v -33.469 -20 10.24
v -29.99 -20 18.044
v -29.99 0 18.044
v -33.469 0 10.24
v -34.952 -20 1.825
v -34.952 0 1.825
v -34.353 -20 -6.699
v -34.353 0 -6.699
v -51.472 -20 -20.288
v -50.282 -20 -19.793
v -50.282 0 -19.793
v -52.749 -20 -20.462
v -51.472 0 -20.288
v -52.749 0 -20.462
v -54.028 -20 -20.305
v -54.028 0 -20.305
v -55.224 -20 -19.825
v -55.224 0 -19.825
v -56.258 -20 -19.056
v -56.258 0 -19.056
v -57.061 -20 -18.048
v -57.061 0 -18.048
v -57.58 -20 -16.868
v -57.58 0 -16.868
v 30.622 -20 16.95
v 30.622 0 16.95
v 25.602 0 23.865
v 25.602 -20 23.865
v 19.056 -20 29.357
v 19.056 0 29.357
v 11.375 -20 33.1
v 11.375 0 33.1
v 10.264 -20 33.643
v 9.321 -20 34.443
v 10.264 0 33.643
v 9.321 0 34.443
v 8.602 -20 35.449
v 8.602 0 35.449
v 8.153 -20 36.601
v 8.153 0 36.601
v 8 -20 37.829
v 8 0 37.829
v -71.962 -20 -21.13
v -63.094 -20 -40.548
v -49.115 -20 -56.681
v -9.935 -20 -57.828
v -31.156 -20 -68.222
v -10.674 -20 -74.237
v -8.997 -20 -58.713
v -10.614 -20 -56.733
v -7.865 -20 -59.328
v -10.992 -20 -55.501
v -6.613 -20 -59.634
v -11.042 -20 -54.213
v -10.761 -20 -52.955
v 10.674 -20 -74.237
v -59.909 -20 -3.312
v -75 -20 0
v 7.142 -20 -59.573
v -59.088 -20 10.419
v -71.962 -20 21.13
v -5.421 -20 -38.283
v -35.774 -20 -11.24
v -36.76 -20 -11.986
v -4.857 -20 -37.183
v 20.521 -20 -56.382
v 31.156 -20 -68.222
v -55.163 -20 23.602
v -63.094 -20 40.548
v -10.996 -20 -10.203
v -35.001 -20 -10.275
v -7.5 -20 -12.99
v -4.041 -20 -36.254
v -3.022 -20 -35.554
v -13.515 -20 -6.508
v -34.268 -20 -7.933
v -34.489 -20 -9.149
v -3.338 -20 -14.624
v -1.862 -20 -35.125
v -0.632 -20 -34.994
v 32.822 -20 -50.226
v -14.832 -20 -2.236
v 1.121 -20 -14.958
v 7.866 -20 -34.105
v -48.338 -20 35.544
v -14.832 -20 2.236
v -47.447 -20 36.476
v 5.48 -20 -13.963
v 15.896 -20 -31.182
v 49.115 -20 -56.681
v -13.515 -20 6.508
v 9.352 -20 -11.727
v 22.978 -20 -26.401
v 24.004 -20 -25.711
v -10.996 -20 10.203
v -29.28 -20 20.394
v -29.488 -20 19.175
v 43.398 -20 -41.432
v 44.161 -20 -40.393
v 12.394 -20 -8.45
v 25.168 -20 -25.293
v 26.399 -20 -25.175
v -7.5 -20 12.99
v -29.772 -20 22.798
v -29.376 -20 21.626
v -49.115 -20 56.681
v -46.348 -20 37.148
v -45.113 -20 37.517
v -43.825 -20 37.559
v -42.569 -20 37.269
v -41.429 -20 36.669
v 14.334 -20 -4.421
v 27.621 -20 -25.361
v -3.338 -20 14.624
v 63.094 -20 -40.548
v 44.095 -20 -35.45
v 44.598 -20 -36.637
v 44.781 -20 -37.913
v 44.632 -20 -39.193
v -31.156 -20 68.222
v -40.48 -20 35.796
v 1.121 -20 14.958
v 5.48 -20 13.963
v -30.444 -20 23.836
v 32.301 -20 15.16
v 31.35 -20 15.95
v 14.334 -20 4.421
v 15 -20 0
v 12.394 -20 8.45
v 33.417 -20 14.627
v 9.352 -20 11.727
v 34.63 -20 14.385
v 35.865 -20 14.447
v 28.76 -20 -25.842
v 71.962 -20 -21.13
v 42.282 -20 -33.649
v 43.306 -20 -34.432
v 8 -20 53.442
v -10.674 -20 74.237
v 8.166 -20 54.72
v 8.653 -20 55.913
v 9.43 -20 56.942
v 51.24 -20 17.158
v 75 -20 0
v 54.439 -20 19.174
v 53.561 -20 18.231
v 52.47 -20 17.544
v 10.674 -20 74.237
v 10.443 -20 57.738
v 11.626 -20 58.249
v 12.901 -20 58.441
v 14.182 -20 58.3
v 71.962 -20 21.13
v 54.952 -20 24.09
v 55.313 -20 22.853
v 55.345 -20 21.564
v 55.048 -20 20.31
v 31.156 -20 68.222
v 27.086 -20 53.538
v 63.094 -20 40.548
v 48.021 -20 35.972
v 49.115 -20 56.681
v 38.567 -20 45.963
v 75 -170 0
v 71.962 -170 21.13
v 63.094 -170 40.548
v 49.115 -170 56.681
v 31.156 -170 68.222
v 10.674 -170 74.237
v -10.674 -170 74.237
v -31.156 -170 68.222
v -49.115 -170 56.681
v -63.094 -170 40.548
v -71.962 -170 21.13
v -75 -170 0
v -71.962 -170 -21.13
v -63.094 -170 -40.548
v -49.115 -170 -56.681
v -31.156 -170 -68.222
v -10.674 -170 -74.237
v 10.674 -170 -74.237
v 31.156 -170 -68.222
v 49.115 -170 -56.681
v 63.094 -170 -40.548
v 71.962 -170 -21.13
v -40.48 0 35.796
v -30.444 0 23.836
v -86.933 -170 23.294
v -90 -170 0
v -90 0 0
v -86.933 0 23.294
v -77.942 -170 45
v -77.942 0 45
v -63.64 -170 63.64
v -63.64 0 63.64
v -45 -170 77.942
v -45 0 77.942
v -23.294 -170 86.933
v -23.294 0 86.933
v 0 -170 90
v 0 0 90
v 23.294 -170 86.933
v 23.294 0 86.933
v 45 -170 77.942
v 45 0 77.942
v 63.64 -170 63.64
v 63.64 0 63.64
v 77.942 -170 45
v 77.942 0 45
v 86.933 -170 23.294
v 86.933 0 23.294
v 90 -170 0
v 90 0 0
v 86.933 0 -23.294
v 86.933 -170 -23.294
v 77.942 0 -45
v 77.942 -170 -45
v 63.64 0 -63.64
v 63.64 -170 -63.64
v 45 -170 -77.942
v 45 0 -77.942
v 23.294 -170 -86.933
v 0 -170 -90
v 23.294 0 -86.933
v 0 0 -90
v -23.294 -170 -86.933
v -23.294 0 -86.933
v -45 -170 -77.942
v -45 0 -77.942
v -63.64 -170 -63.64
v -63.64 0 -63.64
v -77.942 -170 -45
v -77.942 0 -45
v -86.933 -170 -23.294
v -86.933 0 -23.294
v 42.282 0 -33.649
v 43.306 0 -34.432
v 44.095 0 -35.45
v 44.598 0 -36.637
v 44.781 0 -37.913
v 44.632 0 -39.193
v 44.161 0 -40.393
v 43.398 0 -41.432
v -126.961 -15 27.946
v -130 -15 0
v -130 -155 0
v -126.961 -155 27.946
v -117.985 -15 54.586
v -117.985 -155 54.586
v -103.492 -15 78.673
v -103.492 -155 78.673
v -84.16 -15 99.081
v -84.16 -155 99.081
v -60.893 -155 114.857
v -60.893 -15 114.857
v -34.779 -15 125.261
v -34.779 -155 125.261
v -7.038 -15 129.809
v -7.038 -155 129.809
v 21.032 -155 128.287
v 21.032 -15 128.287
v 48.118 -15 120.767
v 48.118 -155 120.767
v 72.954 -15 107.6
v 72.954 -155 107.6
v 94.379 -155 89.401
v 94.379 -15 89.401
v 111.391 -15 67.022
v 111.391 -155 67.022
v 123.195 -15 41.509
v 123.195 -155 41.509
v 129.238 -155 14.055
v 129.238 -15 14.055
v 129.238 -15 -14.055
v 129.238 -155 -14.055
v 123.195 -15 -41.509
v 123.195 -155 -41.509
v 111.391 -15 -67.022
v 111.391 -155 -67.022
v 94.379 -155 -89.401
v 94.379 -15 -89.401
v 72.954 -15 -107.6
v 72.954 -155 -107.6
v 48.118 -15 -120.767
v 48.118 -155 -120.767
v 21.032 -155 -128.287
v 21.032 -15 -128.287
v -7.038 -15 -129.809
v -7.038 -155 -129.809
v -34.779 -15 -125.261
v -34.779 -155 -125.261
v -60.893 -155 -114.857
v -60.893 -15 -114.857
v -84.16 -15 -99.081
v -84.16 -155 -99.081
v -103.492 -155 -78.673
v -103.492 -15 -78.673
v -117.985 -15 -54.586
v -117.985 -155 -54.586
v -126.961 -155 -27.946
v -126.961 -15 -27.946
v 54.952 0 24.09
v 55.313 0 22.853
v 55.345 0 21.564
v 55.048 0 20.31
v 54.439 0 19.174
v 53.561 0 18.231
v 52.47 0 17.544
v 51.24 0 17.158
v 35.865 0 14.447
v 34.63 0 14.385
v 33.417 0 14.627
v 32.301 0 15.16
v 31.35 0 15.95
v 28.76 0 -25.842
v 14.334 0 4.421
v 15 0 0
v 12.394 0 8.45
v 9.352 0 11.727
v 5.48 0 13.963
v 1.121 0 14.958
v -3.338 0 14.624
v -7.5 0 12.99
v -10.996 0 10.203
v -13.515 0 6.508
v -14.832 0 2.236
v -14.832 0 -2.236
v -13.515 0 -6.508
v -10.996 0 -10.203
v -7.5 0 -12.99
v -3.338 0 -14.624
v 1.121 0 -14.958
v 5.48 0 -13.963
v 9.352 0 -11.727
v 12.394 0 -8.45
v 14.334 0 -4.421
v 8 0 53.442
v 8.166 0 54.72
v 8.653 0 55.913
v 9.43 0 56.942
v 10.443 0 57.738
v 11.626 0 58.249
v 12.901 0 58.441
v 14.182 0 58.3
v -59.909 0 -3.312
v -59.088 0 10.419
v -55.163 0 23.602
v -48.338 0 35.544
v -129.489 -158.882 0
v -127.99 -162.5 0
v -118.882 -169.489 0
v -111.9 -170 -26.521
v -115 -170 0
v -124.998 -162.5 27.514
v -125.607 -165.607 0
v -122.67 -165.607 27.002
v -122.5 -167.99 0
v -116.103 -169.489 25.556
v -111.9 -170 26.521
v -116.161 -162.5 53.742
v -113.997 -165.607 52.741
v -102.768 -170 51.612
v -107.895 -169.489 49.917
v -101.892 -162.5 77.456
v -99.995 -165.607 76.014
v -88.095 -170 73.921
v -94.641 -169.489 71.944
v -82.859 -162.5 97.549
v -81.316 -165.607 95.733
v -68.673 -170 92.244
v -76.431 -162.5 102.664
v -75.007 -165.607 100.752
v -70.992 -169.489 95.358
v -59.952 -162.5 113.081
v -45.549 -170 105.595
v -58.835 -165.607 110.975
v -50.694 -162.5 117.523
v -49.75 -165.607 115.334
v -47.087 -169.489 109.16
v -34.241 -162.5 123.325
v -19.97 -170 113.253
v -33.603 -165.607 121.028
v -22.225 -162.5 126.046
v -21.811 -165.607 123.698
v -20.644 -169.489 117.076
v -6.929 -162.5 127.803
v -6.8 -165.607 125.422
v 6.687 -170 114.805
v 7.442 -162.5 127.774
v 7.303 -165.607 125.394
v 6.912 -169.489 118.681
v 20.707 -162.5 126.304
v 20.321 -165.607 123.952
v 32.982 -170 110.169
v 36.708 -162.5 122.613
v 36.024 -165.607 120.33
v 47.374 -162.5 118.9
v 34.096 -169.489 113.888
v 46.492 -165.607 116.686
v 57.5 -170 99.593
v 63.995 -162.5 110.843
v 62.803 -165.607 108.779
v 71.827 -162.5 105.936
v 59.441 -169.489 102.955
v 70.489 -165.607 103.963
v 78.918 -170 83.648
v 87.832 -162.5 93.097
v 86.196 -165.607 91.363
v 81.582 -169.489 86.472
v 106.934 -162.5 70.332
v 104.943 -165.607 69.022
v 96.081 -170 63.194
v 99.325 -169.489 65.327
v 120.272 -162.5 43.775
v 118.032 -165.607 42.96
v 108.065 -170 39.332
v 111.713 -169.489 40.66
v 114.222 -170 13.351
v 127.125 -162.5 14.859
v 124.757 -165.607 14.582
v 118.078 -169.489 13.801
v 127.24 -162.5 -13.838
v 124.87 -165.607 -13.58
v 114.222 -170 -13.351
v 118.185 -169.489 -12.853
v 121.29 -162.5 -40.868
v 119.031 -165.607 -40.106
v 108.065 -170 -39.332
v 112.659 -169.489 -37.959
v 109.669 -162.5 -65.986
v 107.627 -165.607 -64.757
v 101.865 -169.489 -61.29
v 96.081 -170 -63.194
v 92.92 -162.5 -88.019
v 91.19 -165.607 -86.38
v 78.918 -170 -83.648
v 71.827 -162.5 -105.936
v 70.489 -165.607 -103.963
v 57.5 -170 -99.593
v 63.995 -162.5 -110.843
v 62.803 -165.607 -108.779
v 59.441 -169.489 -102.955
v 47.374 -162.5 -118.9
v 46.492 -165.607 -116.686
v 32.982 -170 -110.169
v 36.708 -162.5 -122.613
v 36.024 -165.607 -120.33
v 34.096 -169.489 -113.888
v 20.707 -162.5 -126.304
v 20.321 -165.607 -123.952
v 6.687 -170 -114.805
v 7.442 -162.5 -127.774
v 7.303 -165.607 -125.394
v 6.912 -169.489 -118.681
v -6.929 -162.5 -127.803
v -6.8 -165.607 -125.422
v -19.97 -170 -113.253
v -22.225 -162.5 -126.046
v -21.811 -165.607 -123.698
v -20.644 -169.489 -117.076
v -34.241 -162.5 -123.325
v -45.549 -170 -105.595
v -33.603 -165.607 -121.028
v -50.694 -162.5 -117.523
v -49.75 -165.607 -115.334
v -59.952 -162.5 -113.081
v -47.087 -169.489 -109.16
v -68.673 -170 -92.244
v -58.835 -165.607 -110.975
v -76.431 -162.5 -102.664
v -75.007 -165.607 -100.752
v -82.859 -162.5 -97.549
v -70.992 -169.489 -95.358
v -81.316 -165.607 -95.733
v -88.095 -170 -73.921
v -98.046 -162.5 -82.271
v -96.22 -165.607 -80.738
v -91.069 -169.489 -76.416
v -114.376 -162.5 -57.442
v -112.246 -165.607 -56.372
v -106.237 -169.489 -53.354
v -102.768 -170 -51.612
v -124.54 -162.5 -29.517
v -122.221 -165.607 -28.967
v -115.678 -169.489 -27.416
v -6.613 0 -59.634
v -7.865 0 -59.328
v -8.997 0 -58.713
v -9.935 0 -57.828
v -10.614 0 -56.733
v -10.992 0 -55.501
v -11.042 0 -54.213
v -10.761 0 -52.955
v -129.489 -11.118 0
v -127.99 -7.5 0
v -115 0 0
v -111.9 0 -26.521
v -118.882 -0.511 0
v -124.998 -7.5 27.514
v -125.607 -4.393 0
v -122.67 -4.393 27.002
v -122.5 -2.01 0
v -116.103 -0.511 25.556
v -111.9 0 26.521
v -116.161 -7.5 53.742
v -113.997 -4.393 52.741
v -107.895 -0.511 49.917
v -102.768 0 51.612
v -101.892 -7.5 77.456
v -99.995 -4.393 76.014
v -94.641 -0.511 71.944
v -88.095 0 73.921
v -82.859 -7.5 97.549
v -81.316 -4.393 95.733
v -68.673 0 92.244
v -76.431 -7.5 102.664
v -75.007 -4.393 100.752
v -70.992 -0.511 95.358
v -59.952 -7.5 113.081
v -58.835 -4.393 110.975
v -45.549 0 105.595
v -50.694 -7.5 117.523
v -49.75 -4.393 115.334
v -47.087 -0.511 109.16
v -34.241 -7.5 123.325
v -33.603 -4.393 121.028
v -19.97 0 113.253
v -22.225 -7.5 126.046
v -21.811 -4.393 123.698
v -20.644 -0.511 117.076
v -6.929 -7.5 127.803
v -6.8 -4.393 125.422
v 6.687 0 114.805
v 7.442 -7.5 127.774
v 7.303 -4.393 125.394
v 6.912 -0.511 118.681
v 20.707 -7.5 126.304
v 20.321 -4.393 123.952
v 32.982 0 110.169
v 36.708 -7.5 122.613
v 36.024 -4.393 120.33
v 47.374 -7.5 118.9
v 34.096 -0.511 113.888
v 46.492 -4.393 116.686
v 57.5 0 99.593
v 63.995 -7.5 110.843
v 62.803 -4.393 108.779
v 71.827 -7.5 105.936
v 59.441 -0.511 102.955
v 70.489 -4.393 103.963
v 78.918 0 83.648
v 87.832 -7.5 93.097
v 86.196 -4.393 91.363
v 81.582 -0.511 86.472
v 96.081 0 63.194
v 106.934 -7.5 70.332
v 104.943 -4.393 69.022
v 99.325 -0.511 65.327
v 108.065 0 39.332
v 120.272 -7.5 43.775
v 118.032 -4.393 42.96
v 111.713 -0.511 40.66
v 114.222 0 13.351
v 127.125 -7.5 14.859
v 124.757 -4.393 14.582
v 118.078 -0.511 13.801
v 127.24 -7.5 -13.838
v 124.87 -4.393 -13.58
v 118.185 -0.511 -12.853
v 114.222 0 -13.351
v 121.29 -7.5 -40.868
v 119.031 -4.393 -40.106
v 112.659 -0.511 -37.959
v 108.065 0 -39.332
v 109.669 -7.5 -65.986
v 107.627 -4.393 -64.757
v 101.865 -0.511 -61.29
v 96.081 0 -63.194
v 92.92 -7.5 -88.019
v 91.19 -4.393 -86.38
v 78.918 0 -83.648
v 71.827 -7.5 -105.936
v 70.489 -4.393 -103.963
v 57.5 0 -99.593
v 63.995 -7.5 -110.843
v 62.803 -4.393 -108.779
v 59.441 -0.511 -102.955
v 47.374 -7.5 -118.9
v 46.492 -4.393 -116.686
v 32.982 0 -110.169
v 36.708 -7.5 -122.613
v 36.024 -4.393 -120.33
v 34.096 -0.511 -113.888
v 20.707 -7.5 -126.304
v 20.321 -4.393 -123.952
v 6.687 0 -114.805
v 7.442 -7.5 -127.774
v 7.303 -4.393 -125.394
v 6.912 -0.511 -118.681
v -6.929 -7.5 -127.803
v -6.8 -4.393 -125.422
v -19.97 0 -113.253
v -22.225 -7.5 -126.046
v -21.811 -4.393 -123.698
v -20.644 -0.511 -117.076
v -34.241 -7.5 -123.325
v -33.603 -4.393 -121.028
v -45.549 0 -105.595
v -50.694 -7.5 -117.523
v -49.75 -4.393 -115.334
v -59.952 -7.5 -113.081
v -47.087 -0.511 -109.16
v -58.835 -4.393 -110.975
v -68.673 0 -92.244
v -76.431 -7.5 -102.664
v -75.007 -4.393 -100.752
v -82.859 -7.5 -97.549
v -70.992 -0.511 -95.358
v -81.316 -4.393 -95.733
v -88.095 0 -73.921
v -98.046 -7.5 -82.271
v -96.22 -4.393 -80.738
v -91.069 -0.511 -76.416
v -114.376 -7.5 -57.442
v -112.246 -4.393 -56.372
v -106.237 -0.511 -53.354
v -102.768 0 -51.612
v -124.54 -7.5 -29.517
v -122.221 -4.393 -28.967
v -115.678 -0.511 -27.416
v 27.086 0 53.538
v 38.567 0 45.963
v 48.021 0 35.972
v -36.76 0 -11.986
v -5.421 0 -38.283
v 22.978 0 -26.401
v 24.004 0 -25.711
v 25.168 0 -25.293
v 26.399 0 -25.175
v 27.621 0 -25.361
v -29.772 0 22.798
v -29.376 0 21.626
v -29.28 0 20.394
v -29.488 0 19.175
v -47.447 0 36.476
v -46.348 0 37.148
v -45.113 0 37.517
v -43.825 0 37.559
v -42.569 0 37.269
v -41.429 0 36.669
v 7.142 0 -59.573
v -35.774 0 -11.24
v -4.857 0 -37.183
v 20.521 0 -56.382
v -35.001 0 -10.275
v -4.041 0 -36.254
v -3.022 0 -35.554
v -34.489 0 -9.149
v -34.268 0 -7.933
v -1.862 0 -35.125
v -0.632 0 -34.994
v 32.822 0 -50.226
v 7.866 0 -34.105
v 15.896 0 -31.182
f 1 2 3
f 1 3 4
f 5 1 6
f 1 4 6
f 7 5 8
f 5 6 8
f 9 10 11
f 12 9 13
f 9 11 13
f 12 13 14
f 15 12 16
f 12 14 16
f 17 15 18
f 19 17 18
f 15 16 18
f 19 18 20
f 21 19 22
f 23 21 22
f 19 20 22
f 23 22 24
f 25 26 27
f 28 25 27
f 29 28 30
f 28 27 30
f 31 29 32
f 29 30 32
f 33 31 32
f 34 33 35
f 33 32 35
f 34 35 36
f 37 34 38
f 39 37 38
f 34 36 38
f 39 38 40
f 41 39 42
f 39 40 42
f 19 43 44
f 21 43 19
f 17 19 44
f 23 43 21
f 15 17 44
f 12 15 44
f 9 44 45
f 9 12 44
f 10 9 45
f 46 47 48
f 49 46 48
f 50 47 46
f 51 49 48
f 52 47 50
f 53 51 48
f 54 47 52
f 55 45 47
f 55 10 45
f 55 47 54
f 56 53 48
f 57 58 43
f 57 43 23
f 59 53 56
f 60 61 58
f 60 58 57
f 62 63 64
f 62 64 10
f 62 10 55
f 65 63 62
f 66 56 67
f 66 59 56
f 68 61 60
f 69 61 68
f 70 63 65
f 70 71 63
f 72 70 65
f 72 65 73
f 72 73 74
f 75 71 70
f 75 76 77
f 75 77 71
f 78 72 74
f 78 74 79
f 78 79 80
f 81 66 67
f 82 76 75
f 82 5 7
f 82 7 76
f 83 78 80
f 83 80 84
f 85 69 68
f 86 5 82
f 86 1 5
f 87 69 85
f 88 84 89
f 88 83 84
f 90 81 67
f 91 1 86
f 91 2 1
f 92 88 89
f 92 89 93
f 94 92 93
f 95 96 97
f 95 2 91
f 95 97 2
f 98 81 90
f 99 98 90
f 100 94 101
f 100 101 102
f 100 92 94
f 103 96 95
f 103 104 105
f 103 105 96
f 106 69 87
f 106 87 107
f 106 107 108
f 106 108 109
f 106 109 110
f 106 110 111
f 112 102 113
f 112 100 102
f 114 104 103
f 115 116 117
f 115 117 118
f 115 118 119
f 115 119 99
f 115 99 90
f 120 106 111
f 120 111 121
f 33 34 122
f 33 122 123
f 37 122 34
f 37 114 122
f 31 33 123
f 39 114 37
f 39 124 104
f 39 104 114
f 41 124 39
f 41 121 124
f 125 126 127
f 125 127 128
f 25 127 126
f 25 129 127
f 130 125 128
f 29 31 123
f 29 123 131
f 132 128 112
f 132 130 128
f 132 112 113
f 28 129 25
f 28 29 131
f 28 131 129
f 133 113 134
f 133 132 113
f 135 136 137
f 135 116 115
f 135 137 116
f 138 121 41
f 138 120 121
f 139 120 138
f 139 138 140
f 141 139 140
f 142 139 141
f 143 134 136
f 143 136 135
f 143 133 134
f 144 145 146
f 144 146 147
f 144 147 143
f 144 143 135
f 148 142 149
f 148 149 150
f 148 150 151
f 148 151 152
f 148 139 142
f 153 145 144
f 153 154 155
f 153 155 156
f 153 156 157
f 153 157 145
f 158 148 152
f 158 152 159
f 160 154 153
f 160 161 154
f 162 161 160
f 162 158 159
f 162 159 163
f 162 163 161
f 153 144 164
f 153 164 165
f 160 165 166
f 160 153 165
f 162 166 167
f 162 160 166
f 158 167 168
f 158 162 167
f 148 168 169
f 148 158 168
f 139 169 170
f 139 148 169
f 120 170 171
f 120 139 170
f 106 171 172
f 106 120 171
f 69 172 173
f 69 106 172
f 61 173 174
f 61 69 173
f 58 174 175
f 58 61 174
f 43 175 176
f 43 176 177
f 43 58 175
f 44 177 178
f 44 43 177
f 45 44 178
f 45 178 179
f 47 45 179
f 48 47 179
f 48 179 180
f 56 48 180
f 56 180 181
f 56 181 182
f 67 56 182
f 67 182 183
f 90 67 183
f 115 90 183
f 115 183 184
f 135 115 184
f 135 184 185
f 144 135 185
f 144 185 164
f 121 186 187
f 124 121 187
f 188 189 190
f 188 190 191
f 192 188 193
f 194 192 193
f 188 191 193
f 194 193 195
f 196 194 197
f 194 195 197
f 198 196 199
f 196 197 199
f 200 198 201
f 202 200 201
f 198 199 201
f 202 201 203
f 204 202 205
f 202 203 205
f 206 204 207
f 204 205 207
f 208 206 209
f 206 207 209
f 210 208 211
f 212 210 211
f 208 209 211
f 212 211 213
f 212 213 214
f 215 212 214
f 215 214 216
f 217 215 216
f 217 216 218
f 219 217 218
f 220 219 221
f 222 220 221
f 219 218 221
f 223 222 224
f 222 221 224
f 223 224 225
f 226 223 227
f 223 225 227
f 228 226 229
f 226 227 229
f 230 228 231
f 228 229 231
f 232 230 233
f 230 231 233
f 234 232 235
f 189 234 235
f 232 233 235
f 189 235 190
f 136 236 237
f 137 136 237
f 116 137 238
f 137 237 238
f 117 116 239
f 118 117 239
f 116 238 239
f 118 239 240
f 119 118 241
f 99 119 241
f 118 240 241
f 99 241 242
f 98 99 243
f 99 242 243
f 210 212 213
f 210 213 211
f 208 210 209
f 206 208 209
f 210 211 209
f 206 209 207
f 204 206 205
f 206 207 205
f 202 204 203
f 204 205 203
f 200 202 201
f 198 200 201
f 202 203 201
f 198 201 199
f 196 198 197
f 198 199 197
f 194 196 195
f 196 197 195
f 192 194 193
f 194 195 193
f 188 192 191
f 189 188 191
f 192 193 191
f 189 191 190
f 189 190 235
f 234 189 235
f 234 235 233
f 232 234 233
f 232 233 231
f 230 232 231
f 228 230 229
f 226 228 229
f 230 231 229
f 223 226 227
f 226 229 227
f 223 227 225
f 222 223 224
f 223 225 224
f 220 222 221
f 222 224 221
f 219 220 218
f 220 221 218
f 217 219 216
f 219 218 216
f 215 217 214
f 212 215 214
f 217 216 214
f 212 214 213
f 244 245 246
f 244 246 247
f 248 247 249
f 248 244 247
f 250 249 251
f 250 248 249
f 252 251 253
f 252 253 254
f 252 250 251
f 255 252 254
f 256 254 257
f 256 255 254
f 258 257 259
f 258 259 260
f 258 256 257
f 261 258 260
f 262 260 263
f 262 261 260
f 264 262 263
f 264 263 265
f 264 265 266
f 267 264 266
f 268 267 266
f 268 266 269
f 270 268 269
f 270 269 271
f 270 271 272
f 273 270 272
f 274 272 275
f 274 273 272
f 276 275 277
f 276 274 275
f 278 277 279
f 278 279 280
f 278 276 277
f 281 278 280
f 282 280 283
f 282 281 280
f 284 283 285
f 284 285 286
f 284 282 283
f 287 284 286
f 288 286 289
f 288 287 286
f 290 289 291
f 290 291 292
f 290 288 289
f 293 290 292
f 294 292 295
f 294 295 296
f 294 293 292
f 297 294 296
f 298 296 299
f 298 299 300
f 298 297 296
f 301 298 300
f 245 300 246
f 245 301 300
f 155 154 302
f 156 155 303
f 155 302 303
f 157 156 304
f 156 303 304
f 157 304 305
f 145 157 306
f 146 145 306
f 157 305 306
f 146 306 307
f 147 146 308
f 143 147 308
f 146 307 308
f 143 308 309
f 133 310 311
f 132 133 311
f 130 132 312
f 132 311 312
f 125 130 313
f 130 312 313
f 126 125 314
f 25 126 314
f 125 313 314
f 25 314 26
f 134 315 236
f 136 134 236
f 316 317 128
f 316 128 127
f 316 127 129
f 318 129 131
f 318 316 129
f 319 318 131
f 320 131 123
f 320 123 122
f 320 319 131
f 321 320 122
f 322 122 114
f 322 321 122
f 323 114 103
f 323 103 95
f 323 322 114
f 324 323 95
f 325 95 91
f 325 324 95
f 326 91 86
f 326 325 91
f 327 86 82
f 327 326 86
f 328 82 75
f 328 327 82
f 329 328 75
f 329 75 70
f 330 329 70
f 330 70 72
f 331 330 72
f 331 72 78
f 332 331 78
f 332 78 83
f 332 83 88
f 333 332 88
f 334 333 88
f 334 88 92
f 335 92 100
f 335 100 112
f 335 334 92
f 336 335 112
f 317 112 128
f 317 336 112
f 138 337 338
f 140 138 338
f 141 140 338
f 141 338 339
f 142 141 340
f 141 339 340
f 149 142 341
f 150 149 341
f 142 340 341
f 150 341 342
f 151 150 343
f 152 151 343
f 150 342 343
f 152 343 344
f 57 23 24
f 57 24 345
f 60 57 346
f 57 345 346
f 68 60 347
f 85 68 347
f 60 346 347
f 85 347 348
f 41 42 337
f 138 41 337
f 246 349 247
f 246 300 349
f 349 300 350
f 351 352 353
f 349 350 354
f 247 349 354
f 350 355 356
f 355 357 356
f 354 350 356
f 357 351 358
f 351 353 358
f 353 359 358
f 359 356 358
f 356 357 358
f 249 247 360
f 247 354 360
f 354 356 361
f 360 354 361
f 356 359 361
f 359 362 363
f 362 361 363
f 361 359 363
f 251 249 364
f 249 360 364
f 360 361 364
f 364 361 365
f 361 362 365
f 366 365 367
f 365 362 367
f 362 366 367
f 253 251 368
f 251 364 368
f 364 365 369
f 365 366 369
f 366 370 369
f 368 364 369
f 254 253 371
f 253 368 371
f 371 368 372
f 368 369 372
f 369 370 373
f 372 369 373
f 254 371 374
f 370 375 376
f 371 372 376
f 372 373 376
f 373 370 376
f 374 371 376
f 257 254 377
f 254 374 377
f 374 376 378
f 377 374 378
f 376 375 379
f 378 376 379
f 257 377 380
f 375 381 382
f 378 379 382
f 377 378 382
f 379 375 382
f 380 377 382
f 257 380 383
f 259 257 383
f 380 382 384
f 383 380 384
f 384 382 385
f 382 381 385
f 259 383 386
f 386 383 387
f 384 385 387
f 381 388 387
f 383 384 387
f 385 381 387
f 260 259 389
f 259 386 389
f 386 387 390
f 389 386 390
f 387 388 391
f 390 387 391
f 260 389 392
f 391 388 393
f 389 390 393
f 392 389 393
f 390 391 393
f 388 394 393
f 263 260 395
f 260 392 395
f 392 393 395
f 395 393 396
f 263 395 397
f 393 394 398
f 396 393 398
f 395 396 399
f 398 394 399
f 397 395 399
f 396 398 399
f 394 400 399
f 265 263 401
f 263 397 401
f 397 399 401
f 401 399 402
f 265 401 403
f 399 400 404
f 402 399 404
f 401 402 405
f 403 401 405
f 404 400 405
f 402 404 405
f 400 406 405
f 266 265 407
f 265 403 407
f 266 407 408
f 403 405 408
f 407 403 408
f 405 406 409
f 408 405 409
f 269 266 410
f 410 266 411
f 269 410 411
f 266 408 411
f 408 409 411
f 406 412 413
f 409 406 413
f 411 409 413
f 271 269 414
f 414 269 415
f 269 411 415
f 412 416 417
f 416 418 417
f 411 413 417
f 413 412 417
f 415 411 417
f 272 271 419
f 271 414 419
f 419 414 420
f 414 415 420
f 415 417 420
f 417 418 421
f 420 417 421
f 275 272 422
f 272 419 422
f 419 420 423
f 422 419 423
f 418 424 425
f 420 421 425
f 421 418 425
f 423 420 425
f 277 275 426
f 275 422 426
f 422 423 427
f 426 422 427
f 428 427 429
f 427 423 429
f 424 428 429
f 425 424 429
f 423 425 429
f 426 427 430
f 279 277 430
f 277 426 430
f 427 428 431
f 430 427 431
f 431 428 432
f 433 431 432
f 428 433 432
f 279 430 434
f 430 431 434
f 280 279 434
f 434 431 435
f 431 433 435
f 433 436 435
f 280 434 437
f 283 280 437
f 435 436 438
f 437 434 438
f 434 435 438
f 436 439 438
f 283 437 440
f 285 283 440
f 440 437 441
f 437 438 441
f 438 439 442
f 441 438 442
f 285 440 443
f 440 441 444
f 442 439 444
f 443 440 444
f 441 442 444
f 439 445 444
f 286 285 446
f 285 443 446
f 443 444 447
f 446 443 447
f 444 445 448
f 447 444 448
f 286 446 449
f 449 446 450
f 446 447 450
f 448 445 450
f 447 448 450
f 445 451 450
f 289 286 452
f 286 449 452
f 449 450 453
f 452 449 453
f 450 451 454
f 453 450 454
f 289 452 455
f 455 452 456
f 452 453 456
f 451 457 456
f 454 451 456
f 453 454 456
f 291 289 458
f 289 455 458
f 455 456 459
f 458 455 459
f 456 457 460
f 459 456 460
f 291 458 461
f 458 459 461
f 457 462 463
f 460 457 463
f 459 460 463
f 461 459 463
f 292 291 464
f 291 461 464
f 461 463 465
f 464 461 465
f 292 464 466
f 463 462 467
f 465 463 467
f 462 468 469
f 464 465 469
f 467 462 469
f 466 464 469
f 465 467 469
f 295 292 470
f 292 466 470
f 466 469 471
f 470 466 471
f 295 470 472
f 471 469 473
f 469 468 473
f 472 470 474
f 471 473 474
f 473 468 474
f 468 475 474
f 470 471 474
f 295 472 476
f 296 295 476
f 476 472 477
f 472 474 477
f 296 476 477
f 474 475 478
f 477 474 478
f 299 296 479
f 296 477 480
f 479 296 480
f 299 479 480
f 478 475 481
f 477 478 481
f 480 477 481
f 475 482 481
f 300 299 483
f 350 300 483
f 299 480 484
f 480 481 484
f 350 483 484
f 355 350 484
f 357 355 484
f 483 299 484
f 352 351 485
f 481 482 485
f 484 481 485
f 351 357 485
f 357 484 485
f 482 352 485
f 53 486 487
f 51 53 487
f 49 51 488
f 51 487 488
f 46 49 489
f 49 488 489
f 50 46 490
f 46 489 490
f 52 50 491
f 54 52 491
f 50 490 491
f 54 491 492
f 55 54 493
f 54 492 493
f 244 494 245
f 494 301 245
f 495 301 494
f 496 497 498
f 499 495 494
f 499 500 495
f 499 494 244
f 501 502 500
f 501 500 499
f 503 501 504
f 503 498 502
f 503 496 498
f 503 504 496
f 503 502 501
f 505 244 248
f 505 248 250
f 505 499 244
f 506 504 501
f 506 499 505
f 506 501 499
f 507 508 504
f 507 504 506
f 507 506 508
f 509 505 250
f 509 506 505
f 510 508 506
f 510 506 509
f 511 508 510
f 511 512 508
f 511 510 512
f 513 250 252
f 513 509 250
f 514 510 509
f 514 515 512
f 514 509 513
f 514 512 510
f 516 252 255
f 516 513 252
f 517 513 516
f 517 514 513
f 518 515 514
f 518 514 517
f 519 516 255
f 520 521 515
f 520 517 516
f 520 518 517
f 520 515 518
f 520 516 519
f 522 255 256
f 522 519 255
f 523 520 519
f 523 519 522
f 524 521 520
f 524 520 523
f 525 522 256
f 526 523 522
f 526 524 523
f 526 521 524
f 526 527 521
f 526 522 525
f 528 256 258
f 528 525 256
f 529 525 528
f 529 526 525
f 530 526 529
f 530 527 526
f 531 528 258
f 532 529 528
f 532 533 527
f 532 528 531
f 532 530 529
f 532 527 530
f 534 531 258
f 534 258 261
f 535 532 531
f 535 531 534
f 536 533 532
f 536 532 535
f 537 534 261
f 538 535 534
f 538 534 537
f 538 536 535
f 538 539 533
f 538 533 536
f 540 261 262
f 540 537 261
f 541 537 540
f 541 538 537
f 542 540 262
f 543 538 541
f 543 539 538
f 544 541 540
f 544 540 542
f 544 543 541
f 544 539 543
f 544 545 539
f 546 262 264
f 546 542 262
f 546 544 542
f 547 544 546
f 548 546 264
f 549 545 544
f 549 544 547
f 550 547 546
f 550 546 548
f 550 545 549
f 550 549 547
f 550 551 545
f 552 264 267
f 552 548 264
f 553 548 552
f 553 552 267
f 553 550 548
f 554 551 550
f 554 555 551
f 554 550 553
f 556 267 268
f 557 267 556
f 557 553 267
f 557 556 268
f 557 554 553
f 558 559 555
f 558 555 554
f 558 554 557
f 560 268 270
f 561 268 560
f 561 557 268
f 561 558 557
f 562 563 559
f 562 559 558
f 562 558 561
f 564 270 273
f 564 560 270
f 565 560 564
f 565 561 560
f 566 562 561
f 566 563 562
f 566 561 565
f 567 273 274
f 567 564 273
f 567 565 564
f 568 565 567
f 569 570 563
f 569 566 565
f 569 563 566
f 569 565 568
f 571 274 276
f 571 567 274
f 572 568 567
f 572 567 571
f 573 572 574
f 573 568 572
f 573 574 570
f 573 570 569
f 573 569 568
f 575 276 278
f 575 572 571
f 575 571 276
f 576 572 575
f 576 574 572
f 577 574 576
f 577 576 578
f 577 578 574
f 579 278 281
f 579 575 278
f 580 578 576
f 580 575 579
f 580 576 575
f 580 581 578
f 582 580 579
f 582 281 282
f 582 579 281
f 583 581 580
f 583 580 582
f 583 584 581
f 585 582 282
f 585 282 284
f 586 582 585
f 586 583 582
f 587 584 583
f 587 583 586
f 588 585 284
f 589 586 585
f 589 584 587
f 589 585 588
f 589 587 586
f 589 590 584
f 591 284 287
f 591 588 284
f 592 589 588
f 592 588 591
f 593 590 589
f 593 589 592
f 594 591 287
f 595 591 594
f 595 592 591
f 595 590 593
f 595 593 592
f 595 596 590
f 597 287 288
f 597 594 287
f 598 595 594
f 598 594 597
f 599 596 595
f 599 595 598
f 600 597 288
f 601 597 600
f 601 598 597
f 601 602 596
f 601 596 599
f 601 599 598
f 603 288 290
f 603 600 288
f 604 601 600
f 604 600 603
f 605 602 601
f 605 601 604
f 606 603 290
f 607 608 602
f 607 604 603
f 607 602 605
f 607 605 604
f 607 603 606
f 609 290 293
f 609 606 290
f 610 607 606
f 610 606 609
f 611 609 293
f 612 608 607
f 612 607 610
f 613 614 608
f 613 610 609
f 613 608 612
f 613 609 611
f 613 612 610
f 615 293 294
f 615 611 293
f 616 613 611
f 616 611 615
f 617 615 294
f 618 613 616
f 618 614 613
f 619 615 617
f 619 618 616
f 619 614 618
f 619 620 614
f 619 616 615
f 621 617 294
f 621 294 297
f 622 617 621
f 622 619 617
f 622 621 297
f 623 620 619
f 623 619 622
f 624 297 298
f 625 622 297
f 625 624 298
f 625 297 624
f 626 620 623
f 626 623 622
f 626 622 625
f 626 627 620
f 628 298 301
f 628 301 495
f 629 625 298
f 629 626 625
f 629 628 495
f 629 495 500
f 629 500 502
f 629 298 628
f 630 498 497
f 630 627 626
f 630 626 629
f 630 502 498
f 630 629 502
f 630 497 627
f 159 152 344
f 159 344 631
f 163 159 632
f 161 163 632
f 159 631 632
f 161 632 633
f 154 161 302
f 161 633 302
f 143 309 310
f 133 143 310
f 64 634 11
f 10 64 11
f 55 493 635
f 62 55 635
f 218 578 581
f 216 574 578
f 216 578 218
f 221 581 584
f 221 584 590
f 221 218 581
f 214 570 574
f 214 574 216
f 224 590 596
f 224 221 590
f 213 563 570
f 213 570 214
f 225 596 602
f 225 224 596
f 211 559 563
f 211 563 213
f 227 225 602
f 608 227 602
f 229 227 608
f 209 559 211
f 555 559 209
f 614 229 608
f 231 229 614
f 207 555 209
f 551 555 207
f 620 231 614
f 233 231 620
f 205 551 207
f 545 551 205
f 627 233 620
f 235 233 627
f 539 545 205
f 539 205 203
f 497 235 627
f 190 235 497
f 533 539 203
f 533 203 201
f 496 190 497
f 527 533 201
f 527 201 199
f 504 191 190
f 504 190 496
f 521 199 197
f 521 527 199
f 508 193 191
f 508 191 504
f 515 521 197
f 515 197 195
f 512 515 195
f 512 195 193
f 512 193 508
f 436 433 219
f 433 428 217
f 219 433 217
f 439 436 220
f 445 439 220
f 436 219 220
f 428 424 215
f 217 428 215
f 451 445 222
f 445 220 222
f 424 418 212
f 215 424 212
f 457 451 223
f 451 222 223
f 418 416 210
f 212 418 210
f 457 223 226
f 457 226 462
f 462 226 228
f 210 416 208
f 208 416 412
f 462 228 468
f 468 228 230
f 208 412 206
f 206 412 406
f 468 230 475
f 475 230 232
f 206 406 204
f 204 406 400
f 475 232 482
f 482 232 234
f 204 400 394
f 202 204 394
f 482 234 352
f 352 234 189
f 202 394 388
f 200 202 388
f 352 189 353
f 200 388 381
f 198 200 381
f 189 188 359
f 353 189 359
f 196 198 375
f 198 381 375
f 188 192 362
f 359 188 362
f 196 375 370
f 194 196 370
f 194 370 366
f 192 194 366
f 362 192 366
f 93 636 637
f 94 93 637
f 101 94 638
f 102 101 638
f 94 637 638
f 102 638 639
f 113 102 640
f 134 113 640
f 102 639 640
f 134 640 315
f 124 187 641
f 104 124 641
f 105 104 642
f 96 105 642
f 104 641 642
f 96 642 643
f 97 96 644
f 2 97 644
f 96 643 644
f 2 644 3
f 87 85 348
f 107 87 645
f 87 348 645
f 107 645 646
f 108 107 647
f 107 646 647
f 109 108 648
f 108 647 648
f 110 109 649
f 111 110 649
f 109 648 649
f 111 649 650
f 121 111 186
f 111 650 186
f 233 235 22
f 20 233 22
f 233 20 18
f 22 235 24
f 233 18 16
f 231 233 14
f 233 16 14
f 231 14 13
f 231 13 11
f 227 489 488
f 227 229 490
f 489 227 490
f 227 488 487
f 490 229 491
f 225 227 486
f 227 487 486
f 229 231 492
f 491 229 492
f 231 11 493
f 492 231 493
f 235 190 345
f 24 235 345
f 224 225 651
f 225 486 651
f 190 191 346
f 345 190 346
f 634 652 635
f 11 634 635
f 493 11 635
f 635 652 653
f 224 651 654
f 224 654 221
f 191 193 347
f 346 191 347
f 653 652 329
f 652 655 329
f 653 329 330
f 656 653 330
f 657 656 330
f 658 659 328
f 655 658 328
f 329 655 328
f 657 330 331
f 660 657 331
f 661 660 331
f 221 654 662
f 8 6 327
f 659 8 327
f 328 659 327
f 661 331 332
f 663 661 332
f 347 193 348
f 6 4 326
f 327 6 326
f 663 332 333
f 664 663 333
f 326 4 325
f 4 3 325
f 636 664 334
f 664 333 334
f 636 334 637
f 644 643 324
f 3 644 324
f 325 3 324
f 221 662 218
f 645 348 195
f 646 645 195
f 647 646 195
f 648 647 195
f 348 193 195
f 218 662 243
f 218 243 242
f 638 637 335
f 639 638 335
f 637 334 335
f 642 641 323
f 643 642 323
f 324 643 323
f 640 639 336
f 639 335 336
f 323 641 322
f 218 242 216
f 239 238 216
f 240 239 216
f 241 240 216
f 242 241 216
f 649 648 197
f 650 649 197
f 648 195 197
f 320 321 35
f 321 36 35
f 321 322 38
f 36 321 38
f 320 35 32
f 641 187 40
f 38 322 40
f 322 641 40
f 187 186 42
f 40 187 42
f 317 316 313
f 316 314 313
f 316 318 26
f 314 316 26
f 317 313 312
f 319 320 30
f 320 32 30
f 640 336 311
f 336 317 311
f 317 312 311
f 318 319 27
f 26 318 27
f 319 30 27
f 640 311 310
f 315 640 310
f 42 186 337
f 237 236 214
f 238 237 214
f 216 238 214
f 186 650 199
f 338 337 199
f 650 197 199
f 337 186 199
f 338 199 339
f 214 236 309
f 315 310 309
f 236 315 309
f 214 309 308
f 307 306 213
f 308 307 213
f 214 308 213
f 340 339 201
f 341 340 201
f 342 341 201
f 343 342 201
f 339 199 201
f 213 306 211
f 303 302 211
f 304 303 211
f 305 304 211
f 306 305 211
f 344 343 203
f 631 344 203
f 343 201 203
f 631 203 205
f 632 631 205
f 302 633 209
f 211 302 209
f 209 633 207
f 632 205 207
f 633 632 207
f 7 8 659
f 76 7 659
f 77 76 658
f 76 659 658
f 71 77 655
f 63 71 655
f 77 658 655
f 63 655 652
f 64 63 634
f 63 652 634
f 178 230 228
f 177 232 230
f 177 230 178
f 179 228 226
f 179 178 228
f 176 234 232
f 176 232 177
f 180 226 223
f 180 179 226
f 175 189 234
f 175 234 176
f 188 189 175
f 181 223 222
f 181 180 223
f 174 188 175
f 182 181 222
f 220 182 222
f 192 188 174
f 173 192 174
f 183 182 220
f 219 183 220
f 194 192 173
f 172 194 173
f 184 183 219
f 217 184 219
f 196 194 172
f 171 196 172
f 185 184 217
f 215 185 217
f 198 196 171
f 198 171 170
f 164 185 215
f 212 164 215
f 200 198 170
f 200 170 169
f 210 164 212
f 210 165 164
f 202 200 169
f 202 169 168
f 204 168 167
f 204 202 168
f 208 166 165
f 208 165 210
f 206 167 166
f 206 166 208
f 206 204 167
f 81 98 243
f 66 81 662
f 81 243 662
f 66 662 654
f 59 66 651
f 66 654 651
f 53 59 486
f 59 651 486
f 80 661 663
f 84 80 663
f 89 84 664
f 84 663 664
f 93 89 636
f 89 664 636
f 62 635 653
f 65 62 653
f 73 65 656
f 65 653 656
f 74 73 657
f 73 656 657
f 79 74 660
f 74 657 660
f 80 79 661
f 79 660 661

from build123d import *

# Parameters (mm, degrees)
F0_R     = 75
F0_R_2   = 15
F1_DEPTH = 20
F0_R_3   = 90
F2_DEPTH = 170
F3_R     = 130
F3_R_2   = 90
F4_DEPTH = 170
F5_R     = 15


with BuildPart() as f1:
    # F0 (on Front) → F1 (new body)
    with BuildSketch(Plane.XZ):
        Circle(F0_R)
        with BuildLine():
            ThreePointArc((43.398268, -41.431755), (20.521209, -56.381557), (-6.613183, -59.634435))
            ThreePointArc((-6.613183, -59.634435), (-10.309892, -57.302348), (-10.760548, -52.954798))
            Line((-10.760548, -52.954798), (-5.420589, -38.28338))
            ThreePointArc((-5.420589, -38.28338), (-3.552919, -35.872), (-0.63186, -34.994296))
            ThreePointArc((-0.63186, -34.994296), (11.970705, -32.889242), (22.977933, -26.401034))
            ThreePointArc((22.977933, -26.401034), (25.779771, -25.195774), (28.760495, -25.842484))
            Line((28.760495, -25.842484), (42.281746, -33.648982))
            ThreePointArc((42.281746, -33.648982), (44.731074, -37.269074), (43.398268, -41.431755))
        make_face(mode=Mode.SUBTRACT)
        with BuildLine():
            ThreePointArc((-57.580086, -16.868125), (-59.088465, 10.418891), (-48.338344, 35.544402))
            ThreePointArc((-48.338344, 35.544402), (-44.470343, 37.579802), (-40.479926, 35.796307))
            Line((-40.479926, 35.796307), (-30.444086, 23.836058))
            ThreePointArc((-30.444086, 23.836058), (-29.289604, 21.012918), (-29.990019, 18.044355))
            ThreePointArc((-29.990019, 18.044355), (-34.468271, 6.077686), (-34.352933, -6.698956))
            ThreePointArc((-34.352933, -6.698956), (-34.710065, -9.728049), (-36.760495, -11.986077))
            Line((-36.760495, -11.986077), (-50.281746, -19.792575))
            ThreePointArc((-50.281746, -19.792575), (-54.641502, -20.103709), (-57.580086, -16.868125))
        make_face(mode=Mode.SUBTRACT)
        Circle(F0_R_2, mode=Mode.SUBTRACT)
        with BuildLine():
            Line((8, 37.828561), (8, 53.441557))
            ThreePointArc((8, 53.441557), (9.910428, 57.372784), (14.181818, 58.29988))
            ThreePointArc((14.181818, 58.29988), (38.567257, 45.962667), (54.951527, 24.090032))
            ThreePointArc((54.951527, 24.090032), (54.780235, 19.722546), (51.240474, 17.158491))
            Line((51.240474, 17.158491), (35.864674, 14.447323))
            ThreePointArc((35.864674, 14.447323), (32.842522, 14.859082), (30.621879, 16.949941))
            ThreePointArc((30.621879, 16.949941), (22.497566, 26.811556), (11.375, 33.099991))
            ThreePointArc((11.375, 33.099991), (8.930295, 34.923823), (8, 37.828561))
        make_face(mode=Mode.SUBTRACT)
    extrude(amount=F1_DEPTH)

    # F0 (on Front) → F2 (join)
    with BuildSketch(Plane.XZ):
        Circle(F0_R_3)
        Circle(F0_R, mode=Mode.SUBTRACT)
    extrude(amount=F2_DEPTH)


with BuildPart() as f4:
    # F3 (on face) → F4 (new body)
    with BuildSketch(Plane(origin=(0, 0, 0), x_dir=(-1, 0, 0), z_dir=(0, 1, 0))):
        Circle(F3_R)
        Circle(F3_R_2, mode=Mode.SUBTRACT)
    extrude(amount=-F4_DEPTH)

    # F5
    f5_edges = [f4.edges().sort_by_distance(p)[0] for p in [
        (130, -170, 0),
        (130, 0, 0),
    ]]
    fillet(f5_edges, radius=F5_R)


solid = Compound([f1.part, f4.part])
